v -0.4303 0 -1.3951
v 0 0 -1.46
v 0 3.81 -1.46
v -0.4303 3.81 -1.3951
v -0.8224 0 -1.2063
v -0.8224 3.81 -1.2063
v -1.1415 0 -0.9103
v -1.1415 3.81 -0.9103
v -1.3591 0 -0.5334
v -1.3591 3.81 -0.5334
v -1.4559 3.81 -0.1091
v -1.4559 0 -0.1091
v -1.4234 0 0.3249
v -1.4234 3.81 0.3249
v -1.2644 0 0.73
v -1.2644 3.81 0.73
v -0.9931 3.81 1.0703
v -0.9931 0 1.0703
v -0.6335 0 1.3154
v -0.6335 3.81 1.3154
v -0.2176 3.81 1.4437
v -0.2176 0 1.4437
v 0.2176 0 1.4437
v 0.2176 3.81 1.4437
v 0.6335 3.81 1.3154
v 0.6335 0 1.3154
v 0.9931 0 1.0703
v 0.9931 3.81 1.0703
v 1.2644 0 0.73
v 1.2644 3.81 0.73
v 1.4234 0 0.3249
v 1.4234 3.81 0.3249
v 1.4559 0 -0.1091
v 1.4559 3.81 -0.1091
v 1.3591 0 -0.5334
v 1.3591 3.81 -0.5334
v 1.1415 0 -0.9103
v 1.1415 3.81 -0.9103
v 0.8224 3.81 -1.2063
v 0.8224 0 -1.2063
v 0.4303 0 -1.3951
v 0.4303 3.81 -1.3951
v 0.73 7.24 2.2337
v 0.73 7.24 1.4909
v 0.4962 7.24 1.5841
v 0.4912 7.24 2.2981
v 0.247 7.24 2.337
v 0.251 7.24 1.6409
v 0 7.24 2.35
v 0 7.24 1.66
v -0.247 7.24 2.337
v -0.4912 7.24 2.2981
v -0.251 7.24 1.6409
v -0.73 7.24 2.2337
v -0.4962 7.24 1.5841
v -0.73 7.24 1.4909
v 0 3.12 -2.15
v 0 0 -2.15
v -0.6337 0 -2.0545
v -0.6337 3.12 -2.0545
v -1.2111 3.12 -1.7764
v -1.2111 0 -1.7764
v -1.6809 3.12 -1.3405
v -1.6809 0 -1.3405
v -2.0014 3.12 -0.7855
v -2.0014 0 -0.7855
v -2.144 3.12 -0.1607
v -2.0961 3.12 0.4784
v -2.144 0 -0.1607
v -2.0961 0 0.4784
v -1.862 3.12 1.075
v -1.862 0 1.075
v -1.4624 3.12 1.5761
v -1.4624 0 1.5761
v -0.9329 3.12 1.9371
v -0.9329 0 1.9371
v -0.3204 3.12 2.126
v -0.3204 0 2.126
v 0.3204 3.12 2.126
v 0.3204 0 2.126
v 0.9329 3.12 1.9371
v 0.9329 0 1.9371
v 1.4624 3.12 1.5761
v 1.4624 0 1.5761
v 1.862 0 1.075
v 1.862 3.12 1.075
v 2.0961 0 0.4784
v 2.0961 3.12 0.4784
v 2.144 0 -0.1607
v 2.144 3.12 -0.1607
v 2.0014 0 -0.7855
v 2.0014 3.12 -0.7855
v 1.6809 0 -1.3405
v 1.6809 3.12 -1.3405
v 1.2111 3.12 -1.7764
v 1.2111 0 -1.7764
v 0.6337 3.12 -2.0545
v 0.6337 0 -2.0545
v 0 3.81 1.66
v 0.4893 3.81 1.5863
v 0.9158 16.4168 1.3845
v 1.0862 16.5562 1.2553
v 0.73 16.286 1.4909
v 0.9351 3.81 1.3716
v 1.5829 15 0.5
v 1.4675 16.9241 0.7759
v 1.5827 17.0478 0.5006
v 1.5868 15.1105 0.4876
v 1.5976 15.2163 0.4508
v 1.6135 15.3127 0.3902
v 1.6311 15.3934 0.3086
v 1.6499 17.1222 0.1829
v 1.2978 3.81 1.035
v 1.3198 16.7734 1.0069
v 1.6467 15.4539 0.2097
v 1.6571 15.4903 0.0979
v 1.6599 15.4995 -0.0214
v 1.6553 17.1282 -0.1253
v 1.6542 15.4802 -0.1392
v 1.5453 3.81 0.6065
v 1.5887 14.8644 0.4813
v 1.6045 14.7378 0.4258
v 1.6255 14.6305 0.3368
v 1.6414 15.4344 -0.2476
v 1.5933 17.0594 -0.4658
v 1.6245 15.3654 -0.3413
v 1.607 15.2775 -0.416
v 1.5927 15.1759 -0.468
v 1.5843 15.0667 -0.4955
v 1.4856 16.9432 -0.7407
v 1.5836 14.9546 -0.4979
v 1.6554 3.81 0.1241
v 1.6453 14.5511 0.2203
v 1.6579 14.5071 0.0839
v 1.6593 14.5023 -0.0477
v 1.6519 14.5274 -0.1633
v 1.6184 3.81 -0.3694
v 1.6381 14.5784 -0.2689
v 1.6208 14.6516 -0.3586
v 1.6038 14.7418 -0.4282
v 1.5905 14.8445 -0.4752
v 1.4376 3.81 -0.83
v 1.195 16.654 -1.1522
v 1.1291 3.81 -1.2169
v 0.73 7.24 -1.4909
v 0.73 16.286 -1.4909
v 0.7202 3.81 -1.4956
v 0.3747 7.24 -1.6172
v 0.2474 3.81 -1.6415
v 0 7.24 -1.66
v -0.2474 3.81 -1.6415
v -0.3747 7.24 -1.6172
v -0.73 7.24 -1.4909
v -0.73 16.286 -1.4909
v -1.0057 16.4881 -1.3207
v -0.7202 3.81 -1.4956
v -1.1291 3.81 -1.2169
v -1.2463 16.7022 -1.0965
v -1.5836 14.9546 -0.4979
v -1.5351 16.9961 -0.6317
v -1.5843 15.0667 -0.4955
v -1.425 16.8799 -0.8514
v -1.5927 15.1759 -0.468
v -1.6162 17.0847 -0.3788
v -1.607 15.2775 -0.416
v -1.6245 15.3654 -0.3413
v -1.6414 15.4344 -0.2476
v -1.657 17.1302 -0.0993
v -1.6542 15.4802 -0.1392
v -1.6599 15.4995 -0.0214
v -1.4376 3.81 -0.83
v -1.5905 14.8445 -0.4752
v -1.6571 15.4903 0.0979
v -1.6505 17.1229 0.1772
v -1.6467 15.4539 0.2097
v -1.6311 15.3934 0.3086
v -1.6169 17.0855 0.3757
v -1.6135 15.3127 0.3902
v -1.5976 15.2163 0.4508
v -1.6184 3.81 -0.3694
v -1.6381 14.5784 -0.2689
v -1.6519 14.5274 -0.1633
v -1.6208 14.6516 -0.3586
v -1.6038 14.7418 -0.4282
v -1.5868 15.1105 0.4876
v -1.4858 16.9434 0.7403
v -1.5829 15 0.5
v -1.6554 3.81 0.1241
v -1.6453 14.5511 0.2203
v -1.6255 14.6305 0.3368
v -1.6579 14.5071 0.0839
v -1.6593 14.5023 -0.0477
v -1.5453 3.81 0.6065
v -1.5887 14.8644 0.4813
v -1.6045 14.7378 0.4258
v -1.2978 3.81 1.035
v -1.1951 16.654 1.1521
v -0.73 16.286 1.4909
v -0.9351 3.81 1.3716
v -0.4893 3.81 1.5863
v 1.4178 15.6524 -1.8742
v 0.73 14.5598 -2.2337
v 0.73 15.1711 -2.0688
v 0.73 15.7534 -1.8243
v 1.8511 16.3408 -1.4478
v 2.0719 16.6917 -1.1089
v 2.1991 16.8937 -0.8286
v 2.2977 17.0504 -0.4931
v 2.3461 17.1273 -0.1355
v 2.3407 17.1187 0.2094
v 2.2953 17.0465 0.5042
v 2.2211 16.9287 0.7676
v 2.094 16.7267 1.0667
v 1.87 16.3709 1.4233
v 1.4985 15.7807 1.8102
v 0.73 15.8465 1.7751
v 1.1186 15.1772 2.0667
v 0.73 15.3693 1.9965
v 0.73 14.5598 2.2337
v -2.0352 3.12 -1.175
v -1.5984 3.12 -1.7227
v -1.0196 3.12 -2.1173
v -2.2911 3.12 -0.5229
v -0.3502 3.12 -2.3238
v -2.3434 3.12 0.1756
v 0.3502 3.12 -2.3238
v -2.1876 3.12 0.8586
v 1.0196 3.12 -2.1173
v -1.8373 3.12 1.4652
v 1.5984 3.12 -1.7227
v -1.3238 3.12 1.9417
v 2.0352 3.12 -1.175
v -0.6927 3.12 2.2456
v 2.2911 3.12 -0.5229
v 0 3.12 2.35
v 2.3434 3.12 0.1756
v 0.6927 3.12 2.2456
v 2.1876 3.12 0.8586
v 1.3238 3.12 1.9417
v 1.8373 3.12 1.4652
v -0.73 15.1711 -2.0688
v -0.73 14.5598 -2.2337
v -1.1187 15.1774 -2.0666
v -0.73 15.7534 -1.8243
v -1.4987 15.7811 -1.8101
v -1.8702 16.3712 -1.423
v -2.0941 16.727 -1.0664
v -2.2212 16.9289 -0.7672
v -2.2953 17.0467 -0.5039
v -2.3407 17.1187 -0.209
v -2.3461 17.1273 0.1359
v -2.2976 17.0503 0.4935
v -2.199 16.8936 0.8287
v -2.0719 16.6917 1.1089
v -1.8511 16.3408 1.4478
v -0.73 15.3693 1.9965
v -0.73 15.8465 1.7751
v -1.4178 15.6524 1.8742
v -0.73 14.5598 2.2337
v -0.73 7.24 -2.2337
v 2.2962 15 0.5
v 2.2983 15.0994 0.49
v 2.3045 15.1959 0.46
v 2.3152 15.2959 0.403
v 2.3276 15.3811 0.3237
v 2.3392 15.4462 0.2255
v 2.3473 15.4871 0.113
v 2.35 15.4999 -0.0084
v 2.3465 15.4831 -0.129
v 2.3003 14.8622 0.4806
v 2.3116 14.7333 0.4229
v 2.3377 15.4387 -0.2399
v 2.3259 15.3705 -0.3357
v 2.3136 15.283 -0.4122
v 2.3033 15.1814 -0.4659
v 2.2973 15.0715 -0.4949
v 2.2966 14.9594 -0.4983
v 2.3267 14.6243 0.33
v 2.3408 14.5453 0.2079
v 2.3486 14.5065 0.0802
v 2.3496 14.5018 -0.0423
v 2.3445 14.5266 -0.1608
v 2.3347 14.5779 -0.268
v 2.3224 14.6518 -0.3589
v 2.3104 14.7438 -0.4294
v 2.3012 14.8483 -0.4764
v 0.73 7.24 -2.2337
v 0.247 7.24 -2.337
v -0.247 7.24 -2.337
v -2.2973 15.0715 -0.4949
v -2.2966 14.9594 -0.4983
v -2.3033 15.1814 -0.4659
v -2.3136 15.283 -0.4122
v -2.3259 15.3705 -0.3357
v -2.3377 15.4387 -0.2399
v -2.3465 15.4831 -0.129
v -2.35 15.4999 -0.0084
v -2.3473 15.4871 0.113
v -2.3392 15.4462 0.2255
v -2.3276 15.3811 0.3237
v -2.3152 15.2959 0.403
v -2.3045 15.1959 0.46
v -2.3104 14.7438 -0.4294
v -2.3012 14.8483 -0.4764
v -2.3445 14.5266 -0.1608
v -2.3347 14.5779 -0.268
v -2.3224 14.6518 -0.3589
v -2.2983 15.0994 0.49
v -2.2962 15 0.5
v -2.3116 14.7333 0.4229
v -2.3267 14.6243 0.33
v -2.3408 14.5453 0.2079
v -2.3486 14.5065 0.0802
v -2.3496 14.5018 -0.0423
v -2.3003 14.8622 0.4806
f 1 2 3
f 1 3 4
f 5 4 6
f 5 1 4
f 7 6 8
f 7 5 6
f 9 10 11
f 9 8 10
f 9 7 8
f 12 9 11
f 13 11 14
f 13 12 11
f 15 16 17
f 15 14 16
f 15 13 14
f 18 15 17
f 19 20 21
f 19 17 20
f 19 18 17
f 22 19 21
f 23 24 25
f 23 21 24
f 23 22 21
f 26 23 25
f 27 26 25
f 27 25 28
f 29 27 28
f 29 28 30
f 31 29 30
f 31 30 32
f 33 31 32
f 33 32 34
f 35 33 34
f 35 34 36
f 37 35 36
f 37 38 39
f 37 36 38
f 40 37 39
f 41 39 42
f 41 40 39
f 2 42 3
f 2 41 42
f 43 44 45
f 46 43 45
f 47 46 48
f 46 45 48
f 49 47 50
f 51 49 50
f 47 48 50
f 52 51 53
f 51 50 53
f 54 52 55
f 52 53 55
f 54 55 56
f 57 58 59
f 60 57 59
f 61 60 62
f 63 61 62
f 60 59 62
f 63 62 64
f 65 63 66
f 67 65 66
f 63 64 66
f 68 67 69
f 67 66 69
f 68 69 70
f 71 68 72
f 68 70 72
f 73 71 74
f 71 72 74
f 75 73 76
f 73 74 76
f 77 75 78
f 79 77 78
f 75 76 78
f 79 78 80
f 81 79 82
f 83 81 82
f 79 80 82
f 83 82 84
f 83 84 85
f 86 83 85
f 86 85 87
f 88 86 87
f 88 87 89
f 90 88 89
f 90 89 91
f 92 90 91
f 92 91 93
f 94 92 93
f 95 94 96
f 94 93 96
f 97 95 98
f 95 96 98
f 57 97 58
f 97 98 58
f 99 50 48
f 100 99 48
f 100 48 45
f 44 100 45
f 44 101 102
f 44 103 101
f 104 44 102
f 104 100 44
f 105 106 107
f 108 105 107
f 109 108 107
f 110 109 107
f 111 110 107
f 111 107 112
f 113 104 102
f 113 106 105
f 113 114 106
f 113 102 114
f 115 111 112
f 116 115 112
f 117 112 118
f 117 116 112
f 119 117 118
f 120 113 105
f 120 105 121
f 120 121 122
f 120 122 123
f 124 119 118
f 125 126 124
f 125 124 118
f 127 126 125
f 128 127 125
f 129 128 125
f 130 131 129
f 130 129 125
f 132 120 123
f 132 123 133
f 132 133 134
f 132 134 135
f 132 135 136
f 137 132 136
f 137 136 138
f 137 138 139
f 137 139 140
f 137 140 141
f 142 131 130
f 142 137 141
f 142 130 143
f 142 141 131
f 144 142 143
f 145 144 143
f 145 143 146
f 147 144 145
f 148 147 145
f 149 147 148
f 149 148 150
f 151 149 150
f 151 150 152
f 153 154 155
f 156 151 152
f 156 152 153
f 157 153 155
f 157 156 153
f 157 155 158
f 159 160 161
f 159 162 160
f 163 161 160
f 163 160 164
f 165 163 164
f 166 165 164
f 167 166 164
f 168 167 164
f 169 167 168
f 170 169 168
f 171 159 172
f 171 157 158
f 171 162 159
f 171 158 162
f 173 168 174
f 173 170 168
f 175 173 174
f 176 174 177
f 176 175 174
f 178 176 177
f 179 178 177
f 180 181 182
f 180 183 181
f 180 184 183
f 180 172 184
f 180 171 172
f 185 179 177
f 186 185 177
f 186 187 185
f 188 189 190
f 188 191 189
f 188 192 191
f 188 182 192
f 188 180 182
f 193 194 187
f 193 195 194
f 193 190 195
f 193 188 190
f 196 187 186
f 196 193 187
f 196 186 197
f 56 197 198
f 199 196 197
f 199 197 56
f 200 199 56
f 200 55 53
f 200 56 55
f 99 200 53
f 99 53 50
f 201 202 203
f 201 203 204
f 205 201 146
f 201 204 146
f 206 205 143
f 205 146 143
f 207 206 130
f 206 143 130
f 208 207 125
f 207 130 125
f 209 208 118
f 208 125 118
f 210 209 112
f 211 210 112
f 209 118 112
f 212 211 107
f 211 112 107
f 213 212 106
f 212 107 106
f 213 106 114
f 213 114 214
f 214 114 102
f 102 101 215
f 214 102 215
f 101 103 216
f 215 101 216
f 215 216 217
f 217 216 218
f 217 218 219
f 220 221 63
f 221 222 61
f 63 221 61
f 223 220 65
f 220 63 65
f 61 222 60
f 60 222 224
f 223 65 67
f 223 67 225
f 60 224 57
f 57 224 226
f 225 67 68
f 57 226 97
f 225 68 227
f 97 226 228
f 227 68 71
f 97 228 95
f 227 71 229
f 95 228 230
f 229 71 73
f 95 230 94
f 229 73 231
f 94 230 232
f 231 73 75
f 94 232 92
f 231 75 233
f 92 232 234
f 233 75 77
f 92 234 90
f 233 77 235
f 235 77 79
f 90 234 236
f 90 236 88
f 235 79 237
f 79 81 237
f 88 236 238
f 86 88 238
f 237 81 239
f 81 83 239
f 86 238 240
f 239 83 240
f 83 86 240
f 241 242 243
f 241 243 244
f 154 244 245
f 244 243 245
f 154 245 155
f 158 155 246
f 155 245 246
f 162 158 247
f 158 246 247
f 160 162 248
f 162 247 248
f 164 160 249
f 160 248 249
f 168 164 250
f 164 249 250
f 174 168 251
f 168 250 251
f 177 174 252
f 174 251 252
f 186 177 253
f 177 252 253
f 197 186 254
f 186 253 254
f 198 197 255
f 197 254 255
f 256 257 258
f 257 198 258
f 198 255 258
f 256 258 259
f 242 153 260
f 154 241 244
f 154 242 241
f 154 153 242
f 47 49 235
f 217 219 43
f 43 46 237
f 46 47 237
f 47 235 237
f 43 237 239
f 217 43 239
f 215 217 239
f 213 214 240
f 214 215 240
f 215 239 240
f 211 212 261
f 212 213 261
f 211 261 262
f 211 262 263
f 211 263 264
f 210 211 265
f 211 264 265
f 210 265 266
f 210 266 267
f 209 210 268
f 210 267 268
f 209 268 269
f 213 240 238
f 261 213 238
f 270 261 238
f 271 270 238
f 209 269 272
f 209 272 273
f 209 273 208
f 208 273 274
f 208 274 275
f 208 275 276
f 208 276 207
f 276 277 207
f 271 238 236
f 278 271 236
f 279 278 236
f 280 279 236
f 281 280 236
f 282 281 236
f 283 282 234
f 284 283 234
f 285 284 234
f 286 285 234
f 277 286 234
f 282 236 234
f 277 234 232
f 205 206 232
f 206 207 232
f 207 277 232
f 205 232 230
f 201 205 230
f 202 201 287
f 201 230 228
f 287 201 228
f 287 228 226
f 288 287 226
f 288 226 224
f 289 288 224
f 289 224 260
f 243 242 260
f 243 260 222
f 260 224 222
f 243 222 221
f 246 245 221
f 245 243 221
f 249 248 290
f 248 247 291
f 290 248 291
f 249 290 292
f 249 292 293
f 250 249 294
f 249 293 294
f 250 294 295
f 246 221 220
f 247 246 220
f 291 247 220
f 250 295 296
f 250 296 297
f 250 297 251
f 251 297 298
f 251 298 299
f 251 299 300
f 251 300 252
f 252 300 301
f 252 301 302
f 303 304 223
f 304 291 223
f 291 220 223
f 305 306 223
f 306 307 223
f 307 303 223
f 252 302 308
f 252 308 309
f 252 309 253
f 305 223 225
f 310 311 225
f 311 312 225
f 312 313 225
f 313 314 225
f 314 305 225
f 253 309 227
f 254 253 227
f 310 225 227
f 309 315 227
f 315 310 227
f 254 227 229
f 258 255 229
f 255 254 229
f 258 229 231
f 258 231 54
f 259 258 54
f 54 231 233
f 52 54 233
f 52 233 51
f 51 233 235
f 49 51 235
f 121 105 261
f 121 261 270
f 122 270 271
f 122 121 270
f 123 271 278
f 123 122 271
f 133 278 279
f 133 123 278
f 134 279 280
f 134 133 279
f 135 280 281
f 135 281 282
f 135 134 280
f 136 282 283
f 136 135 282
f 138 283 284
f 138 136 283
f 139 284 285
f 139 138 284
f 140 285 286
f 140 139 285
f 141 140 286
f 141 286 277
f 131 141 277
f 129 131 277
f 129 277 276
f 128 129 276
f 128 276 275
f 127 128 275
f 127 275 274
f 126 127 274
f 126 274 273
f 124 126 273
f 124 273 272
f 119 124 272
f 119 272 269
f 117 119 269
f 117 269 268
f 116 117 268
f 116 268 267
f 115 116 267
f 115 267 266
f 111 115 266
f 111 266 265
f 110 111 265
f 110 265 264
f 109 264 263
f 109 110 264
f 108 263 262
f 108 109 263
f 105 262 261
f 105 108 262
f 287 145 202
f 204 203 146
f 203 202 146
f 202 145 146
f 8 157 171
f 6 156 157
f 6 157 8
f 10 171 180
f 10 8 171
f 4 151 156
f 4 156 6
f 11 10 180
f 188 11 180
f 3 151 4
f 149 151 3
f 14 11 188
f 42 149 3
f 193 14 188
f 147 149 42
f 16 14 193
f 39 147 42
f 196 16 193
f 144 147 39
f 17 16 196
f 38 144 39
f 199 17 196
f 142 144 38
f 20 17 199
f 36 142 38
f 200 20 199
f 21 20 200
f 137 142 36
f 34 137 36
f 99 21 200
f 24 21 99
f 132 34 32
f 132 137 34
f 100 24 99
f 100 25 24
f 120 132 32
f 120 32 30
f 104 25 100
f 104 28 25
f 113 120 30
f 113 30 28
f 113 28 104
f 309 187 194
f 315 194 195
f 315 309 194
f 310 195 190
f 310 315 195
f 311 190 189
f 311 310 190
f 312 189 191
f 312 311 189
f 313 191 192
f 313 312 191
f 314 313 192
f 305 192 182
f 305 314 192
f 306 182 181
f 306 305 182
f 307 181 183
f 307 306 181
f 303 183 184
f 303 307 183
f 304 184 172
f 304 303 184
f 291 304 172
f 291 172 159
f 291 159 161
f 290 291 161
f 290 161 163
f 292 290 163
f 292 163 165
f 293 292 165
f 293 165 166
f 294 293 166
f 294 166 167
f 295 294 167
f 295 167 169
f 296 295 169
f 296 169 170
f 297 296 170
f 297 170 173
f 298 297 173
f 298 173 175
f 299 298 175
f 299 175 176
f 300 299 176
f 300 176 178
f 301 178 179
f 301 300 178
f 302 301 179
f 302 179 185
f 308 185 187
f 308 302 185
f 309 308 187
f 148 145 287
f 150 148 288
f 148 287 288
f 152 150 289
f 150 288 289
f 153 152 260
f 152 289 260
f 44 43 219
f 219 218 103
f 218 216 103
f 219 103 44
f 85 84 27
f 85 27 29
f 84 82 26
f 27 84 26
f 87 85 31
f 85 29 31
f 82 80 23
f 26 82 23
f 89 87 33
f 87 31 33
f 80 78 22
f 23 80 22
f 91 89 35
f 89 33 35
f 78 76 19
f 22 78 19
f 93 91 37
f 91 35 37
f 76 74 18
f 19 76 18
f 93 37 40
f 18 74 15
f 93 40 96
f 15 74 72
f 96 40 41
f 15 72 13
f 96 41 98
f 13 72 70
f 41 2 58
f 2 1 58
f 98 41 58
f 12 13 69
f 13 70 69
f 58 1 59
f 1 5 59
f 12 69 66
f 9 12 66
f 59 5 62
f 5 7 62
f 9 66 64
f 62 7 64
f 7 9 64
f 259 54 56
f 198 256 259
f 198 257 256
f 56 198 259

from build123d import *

# Parameters (mm, degrees)
SKETCH1_R               = 2.15
BOSS_EXTRUDE1_DEPTH     = 3.12
SKETCH2_R               = 2.35
BOSS_EXTRUDE2_DEPTH     = 14.2
SHELL1_T                = -0.69
CUT_EXTRUDE2_DEPTH      = 10
CUT_EXTRUDE2_DEPTH_BACK = 10
SKETCH9_W               = 1.46
SKETCH9_H               = 4.728587073
CUT_EXTRUDE3_DEPTH      = 10.08
CUT_EXTRUDE4_DEPTH      = 10.08
CUT_EXTRUDE4_DEPTH_BACK = 10.08
SKETCH11_R              = 0.5


with BuildPart() as part:
    # Sketch1 → Boss-Extrude1 (new body)
    with BuildSketch(Plane(origin=(0, 0, 0), x_dir=(1, 0, 0), z_dir=(0, 1, 0))):
        Circle(SKETCH1_R)
    extrude(amount=BOSS_EXTRUDE1_DEPTH)

    # Sketch2 → Boss-Extrude2 (add)
    with BuildSketch(Plane(origin=(0, 3.12, 0), x_dir=(1, 0, 0), z_dir=(0, 1, 0))):
        Circle(SKETCH2_R)
    extrude(amount=BOSS_EXTRUDE2_DEPTH)

    # Shell1
    shell1_openings = [part.faces().sort_by_distance(p)[0] for p in [
        (0, 17.32, 0),
        (0, 0, 0),
    ]]
    offset(amount=SHELL1_T, openings=shell1_openings, kind=Kind.INTERSECTION)

    # Sketch7 → Cut-Extrude2 (cut, two sides: drawn at the far end of the back side and taken through both)
    with BuildSketch(Plane(origin=(0, 0, 0), x_dir=(0, 0, -1), z_dir=(1, 0, 0)).offset(-CUT_EXTRUDE2_DEPTH_BACK)):
        with BuildLine():
            Line((-4.35, 13.399999995), (-2.35, 13.399999995))
            add(Edge.make_bspline(
                [(2.35, 13.399999995), (2.35, 17.133503588), (0, 17.133503588), (-2.35, 17.133503588), (-2.35, 13.399999995)],
                knots=[4.71238898, 4.71238898, 4.71238898, 6.283185307, 6.283185307, 7.853981634, 7.853981634, 7.853981634], degree=2, weights=[1, 0.707106781, 1, 0.707106781, 1]))
            Line((2.35, 13.399999995), (4.35, 13.399999995))
            add(Edge.make_bspline(
                [(4.35, 13.399999995), (4.35, 14.065444098), (4.192339822, 15.412663566), (3.474819887, 17.250199614), (2.38815107, 18.531514052), (1.114988399, 19.194360722), (0, 19.382819631), (-1.114988399, 19.194360722), (-2.38815107, 18.531514052), (-3.474819887, 17.250199614), (-4.192339822, 15.412663566), (-4.35, 14.065444098), (-4.35, 13.399999995)],
                knots=[-1.570796327, -1.570796327, -1.570796327, -1.570796327, -1.178097245, -0.785398163, -0.392699082, -0.196349541, 0, 0.196349541, 0.392699082, 0.785398163, 1.178097245, 1.570796327, 1.570796327, 1.570796327, 1.570796327], degree=3))
        make_face()
    extrude(amount=CUT_EXTRUDE2_DEPTH + CUT_EXTRUDE2_DEPTH_BACK, mode=Mode.SUBTRACT)

    # Sketch9 → Cut-Extrude3 (cut)
    with BuildSketch(Plane(origin=(0, 17.32, 0), x_dir=(-1, 0, 0), z_dir=(0, -1, 0))):
        with Locations((0, -0.000375881)):
            Rectangle(SKETCH9_W, SKETCH9_H)
    extrude(amount=CUT_EXTRUDE3_DEPTH, mode=Mode.SUBTRACT)

    # Sketch11 → Cut-Extrude4 (cut, two sides: drawn at the far end of the back side and taken through both)
    with BuildSketch(Plane(origin=(0, 0, 0), x_dir=(0, 0, -1), z_dir=(1, 0, 0)).offset(-CUT_EXTRUDE4_DEPTH_BACK)):
        with Locations((0, 15)):
            Circle(SKETCH11_R)
    extrude(amount=CUT_EXTRUDE4_DEPTH + CUT_EXTRUDE4_DEPTH_BACK, mode=Mode.SUBTRACT)


solid = part.part
